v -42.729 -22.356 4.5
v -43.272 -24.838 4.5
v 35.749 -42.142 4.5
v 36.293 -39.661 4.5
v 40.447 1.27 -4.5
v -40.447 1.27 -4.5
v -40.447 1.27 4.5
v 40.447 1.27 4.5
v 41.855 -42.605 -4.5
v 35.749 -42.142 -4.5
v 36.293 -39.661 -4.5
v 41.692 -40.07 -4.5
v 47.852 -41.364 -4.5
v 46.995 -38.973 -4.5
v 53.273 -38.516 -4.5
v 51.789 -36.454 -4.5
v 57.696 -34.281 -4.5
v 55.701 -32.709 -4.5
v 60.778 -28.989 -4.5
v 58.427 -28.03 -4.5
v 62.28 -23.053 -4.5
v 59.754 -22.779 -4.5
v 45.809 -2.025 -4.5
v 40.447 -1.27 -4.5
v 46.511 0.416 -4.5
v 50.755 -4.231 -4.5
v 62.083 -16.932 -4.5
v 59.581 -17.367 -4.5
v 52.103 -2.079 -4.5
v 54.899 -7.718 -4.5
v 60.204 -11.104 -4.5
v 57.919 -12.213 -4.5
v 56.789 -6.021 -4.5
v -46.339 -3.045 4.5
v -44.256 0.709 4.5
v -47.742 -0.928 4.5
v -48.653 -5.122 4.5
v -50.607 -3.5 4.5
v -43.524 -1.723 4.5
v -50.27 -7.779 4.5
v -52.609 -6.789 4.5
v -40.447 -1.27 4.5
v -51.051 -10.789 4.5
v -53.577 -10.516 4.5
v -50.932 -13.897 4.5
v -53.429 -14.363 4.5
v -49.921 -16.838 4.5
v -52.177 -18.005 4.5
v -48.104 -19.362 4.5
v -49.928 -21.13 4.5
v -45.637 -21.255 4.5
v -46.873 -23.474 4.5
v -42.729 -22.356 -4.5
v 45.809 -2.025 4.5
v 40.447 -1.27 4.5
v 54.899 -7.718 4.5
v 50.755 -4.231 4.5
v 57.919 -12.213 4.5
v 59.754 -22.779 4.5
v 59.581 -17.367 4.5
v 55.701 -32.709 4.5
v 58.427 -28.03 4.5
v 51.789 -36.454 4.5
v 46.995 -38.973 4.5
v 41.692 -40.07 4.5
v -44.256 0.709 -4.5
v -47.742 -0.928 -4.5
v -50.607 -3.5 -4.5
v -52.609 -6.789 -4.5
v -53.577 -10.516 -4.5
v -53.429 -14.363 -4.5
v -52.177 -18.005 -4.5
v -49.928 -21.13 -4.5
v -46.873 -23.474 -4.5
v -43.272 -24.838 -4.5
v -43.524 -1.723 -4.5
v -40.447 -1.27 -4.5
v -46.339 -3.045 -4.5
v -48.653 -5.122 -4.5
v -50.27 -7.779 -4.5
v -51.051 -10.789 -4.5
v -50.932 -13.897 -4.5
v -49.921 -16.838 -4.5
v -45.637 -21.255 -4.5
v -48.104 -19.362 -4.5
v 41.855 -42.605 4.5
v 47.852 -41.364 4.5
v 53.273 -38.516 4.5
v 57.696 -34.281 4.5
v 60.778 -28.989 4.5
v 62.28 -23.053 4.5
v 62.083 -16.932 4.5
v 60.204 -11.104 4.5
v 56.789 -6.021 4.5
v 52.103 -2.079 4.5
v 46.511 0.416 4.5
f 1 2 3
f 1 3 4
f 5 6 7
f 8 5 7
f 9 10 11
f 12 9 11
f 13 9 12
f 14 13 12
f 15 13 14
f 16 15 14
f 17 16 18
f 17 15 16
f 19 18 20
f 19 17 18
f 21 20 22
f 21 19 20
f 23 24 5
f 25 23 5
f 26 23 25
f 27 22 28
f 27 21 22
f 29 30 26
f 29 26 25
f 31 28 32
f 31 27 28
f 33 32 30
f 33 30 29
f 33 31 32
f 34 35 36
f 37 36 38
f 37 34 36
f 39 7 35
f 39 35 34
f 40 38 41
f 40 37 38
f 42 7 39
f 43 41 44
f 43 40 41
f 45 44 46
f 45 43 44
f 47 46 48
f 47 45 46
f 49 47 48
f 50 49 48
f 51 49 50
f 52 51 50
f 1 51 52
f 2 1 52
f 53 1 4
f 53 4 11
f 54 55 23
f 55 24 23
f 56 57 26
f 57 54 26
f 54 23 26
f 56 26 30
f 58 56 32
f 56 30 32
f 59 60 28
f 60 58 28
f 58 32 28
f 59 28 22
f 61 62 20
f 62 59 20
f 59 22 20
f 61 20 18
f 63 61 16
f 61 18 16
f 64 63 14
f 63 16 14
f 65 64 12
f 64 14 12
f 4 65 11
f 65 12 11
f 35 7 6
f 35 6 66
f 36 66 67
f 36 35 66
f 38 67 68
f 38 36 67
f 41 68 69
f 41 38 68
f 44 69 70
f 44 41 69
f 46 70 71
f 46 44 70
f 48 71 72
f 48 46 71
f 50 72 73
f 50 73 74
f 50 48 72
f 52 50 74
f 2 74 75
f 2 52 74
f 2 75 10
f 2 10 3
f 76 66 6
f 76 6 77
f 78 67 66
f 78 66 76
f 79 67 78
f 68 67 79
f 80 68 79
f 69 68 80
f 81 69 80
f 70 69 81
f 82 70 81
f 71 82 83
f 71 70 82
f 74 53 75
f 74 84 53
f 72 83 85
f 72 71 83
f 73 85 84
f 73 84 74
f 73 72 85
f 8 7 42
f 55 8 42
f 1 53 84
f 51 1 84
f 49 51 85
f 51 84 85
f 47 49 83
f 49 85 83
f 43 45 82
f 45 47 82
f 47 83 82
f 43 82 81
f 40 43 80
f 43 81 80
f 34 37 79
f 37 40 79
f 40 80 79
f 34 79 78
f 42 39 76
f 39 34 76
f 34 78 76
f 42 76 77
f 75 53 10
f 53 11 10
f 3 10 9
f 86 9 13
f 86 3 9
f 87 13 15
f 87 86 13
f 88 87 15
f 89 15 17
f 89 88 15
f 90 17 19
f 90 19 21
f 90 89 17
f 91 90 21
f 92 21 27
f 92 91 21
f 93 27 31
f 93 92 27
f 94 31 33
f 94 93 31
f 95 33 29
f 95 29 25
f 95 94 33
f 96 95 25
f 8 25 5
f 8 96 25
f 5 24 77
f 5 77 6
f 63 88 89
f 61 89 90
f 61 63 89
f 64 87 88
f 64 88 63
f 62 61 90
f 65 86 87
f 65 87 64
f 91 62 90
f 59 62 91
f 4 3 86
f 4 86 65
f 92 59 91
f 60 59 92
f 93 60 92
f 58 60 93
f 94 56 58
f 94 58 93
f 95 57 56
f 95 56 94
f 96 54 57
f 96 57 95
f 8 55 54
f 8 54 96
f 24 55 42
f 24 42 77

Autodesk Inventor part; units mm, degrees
ref_plane "YZ Plane" through (0, 0, 0) normal (1, 0, 0) x (0, 1, 0)
ref_plane "XZ Plane" through (0, 0, 0) normal (0, 1, 0) x (-1, 0, 0)
ref_plane "XY Plane" through (0, 0, 0) normal (0, 0, 1) x (1, 0, 0)
sketch "Sketch1" plane through (0, 0, 0) normal (1, 0, 0) x (0, 1, 0)
  line L0 (1.27, -4.5) -> (-1.27, -4.5)
  line L1 (-1.27, -4.5) -> (-1.27, 4.5)
  line L2 (-1.27, 4.5) -> (1.27, 4.5)
  line L3 (1.27, 4.5) -> (1.27, -4.5)
  line L4 (1.27, -4.5) -> (-1.27, 4.5) construction
  line L5 (-1.27, -4.5) -> (1.27, 4.5) construction
  point P0 (0, 0)
  point P1 (0, 0)
  dimension "d0" = 9
  dimension "d1" = 2.54
sketch "Sketch2" plane through (0, 0, 0) normal (0, 0, 1) x (1, 0, 0)
  arc A0 (-40.4468, 0) -> (-43.0003, -23.5969) centre (-40.4468, -11.9366) ccw
  arc A1 (36.0209, -40.9014) -> (40.4468, 0) centre (40.4468, -20.6901) ccw
  line L0 (-40.4468, 0) -> (40.4468, 0)
  line L1 (36.0209, -40.9014) -> (-43.0003, -23.5969)
  point P0 (0, 0)
  point P1 (0, 0)
  dimension "d2" = 81.3659
  dimension "d3" = 11.9366
  dimension "d6" = 20.6901
sweep "Sweep1" add profiles "Sketch1" path "Sketch2"
properties part number "53t_Belt" material "Rubber"
